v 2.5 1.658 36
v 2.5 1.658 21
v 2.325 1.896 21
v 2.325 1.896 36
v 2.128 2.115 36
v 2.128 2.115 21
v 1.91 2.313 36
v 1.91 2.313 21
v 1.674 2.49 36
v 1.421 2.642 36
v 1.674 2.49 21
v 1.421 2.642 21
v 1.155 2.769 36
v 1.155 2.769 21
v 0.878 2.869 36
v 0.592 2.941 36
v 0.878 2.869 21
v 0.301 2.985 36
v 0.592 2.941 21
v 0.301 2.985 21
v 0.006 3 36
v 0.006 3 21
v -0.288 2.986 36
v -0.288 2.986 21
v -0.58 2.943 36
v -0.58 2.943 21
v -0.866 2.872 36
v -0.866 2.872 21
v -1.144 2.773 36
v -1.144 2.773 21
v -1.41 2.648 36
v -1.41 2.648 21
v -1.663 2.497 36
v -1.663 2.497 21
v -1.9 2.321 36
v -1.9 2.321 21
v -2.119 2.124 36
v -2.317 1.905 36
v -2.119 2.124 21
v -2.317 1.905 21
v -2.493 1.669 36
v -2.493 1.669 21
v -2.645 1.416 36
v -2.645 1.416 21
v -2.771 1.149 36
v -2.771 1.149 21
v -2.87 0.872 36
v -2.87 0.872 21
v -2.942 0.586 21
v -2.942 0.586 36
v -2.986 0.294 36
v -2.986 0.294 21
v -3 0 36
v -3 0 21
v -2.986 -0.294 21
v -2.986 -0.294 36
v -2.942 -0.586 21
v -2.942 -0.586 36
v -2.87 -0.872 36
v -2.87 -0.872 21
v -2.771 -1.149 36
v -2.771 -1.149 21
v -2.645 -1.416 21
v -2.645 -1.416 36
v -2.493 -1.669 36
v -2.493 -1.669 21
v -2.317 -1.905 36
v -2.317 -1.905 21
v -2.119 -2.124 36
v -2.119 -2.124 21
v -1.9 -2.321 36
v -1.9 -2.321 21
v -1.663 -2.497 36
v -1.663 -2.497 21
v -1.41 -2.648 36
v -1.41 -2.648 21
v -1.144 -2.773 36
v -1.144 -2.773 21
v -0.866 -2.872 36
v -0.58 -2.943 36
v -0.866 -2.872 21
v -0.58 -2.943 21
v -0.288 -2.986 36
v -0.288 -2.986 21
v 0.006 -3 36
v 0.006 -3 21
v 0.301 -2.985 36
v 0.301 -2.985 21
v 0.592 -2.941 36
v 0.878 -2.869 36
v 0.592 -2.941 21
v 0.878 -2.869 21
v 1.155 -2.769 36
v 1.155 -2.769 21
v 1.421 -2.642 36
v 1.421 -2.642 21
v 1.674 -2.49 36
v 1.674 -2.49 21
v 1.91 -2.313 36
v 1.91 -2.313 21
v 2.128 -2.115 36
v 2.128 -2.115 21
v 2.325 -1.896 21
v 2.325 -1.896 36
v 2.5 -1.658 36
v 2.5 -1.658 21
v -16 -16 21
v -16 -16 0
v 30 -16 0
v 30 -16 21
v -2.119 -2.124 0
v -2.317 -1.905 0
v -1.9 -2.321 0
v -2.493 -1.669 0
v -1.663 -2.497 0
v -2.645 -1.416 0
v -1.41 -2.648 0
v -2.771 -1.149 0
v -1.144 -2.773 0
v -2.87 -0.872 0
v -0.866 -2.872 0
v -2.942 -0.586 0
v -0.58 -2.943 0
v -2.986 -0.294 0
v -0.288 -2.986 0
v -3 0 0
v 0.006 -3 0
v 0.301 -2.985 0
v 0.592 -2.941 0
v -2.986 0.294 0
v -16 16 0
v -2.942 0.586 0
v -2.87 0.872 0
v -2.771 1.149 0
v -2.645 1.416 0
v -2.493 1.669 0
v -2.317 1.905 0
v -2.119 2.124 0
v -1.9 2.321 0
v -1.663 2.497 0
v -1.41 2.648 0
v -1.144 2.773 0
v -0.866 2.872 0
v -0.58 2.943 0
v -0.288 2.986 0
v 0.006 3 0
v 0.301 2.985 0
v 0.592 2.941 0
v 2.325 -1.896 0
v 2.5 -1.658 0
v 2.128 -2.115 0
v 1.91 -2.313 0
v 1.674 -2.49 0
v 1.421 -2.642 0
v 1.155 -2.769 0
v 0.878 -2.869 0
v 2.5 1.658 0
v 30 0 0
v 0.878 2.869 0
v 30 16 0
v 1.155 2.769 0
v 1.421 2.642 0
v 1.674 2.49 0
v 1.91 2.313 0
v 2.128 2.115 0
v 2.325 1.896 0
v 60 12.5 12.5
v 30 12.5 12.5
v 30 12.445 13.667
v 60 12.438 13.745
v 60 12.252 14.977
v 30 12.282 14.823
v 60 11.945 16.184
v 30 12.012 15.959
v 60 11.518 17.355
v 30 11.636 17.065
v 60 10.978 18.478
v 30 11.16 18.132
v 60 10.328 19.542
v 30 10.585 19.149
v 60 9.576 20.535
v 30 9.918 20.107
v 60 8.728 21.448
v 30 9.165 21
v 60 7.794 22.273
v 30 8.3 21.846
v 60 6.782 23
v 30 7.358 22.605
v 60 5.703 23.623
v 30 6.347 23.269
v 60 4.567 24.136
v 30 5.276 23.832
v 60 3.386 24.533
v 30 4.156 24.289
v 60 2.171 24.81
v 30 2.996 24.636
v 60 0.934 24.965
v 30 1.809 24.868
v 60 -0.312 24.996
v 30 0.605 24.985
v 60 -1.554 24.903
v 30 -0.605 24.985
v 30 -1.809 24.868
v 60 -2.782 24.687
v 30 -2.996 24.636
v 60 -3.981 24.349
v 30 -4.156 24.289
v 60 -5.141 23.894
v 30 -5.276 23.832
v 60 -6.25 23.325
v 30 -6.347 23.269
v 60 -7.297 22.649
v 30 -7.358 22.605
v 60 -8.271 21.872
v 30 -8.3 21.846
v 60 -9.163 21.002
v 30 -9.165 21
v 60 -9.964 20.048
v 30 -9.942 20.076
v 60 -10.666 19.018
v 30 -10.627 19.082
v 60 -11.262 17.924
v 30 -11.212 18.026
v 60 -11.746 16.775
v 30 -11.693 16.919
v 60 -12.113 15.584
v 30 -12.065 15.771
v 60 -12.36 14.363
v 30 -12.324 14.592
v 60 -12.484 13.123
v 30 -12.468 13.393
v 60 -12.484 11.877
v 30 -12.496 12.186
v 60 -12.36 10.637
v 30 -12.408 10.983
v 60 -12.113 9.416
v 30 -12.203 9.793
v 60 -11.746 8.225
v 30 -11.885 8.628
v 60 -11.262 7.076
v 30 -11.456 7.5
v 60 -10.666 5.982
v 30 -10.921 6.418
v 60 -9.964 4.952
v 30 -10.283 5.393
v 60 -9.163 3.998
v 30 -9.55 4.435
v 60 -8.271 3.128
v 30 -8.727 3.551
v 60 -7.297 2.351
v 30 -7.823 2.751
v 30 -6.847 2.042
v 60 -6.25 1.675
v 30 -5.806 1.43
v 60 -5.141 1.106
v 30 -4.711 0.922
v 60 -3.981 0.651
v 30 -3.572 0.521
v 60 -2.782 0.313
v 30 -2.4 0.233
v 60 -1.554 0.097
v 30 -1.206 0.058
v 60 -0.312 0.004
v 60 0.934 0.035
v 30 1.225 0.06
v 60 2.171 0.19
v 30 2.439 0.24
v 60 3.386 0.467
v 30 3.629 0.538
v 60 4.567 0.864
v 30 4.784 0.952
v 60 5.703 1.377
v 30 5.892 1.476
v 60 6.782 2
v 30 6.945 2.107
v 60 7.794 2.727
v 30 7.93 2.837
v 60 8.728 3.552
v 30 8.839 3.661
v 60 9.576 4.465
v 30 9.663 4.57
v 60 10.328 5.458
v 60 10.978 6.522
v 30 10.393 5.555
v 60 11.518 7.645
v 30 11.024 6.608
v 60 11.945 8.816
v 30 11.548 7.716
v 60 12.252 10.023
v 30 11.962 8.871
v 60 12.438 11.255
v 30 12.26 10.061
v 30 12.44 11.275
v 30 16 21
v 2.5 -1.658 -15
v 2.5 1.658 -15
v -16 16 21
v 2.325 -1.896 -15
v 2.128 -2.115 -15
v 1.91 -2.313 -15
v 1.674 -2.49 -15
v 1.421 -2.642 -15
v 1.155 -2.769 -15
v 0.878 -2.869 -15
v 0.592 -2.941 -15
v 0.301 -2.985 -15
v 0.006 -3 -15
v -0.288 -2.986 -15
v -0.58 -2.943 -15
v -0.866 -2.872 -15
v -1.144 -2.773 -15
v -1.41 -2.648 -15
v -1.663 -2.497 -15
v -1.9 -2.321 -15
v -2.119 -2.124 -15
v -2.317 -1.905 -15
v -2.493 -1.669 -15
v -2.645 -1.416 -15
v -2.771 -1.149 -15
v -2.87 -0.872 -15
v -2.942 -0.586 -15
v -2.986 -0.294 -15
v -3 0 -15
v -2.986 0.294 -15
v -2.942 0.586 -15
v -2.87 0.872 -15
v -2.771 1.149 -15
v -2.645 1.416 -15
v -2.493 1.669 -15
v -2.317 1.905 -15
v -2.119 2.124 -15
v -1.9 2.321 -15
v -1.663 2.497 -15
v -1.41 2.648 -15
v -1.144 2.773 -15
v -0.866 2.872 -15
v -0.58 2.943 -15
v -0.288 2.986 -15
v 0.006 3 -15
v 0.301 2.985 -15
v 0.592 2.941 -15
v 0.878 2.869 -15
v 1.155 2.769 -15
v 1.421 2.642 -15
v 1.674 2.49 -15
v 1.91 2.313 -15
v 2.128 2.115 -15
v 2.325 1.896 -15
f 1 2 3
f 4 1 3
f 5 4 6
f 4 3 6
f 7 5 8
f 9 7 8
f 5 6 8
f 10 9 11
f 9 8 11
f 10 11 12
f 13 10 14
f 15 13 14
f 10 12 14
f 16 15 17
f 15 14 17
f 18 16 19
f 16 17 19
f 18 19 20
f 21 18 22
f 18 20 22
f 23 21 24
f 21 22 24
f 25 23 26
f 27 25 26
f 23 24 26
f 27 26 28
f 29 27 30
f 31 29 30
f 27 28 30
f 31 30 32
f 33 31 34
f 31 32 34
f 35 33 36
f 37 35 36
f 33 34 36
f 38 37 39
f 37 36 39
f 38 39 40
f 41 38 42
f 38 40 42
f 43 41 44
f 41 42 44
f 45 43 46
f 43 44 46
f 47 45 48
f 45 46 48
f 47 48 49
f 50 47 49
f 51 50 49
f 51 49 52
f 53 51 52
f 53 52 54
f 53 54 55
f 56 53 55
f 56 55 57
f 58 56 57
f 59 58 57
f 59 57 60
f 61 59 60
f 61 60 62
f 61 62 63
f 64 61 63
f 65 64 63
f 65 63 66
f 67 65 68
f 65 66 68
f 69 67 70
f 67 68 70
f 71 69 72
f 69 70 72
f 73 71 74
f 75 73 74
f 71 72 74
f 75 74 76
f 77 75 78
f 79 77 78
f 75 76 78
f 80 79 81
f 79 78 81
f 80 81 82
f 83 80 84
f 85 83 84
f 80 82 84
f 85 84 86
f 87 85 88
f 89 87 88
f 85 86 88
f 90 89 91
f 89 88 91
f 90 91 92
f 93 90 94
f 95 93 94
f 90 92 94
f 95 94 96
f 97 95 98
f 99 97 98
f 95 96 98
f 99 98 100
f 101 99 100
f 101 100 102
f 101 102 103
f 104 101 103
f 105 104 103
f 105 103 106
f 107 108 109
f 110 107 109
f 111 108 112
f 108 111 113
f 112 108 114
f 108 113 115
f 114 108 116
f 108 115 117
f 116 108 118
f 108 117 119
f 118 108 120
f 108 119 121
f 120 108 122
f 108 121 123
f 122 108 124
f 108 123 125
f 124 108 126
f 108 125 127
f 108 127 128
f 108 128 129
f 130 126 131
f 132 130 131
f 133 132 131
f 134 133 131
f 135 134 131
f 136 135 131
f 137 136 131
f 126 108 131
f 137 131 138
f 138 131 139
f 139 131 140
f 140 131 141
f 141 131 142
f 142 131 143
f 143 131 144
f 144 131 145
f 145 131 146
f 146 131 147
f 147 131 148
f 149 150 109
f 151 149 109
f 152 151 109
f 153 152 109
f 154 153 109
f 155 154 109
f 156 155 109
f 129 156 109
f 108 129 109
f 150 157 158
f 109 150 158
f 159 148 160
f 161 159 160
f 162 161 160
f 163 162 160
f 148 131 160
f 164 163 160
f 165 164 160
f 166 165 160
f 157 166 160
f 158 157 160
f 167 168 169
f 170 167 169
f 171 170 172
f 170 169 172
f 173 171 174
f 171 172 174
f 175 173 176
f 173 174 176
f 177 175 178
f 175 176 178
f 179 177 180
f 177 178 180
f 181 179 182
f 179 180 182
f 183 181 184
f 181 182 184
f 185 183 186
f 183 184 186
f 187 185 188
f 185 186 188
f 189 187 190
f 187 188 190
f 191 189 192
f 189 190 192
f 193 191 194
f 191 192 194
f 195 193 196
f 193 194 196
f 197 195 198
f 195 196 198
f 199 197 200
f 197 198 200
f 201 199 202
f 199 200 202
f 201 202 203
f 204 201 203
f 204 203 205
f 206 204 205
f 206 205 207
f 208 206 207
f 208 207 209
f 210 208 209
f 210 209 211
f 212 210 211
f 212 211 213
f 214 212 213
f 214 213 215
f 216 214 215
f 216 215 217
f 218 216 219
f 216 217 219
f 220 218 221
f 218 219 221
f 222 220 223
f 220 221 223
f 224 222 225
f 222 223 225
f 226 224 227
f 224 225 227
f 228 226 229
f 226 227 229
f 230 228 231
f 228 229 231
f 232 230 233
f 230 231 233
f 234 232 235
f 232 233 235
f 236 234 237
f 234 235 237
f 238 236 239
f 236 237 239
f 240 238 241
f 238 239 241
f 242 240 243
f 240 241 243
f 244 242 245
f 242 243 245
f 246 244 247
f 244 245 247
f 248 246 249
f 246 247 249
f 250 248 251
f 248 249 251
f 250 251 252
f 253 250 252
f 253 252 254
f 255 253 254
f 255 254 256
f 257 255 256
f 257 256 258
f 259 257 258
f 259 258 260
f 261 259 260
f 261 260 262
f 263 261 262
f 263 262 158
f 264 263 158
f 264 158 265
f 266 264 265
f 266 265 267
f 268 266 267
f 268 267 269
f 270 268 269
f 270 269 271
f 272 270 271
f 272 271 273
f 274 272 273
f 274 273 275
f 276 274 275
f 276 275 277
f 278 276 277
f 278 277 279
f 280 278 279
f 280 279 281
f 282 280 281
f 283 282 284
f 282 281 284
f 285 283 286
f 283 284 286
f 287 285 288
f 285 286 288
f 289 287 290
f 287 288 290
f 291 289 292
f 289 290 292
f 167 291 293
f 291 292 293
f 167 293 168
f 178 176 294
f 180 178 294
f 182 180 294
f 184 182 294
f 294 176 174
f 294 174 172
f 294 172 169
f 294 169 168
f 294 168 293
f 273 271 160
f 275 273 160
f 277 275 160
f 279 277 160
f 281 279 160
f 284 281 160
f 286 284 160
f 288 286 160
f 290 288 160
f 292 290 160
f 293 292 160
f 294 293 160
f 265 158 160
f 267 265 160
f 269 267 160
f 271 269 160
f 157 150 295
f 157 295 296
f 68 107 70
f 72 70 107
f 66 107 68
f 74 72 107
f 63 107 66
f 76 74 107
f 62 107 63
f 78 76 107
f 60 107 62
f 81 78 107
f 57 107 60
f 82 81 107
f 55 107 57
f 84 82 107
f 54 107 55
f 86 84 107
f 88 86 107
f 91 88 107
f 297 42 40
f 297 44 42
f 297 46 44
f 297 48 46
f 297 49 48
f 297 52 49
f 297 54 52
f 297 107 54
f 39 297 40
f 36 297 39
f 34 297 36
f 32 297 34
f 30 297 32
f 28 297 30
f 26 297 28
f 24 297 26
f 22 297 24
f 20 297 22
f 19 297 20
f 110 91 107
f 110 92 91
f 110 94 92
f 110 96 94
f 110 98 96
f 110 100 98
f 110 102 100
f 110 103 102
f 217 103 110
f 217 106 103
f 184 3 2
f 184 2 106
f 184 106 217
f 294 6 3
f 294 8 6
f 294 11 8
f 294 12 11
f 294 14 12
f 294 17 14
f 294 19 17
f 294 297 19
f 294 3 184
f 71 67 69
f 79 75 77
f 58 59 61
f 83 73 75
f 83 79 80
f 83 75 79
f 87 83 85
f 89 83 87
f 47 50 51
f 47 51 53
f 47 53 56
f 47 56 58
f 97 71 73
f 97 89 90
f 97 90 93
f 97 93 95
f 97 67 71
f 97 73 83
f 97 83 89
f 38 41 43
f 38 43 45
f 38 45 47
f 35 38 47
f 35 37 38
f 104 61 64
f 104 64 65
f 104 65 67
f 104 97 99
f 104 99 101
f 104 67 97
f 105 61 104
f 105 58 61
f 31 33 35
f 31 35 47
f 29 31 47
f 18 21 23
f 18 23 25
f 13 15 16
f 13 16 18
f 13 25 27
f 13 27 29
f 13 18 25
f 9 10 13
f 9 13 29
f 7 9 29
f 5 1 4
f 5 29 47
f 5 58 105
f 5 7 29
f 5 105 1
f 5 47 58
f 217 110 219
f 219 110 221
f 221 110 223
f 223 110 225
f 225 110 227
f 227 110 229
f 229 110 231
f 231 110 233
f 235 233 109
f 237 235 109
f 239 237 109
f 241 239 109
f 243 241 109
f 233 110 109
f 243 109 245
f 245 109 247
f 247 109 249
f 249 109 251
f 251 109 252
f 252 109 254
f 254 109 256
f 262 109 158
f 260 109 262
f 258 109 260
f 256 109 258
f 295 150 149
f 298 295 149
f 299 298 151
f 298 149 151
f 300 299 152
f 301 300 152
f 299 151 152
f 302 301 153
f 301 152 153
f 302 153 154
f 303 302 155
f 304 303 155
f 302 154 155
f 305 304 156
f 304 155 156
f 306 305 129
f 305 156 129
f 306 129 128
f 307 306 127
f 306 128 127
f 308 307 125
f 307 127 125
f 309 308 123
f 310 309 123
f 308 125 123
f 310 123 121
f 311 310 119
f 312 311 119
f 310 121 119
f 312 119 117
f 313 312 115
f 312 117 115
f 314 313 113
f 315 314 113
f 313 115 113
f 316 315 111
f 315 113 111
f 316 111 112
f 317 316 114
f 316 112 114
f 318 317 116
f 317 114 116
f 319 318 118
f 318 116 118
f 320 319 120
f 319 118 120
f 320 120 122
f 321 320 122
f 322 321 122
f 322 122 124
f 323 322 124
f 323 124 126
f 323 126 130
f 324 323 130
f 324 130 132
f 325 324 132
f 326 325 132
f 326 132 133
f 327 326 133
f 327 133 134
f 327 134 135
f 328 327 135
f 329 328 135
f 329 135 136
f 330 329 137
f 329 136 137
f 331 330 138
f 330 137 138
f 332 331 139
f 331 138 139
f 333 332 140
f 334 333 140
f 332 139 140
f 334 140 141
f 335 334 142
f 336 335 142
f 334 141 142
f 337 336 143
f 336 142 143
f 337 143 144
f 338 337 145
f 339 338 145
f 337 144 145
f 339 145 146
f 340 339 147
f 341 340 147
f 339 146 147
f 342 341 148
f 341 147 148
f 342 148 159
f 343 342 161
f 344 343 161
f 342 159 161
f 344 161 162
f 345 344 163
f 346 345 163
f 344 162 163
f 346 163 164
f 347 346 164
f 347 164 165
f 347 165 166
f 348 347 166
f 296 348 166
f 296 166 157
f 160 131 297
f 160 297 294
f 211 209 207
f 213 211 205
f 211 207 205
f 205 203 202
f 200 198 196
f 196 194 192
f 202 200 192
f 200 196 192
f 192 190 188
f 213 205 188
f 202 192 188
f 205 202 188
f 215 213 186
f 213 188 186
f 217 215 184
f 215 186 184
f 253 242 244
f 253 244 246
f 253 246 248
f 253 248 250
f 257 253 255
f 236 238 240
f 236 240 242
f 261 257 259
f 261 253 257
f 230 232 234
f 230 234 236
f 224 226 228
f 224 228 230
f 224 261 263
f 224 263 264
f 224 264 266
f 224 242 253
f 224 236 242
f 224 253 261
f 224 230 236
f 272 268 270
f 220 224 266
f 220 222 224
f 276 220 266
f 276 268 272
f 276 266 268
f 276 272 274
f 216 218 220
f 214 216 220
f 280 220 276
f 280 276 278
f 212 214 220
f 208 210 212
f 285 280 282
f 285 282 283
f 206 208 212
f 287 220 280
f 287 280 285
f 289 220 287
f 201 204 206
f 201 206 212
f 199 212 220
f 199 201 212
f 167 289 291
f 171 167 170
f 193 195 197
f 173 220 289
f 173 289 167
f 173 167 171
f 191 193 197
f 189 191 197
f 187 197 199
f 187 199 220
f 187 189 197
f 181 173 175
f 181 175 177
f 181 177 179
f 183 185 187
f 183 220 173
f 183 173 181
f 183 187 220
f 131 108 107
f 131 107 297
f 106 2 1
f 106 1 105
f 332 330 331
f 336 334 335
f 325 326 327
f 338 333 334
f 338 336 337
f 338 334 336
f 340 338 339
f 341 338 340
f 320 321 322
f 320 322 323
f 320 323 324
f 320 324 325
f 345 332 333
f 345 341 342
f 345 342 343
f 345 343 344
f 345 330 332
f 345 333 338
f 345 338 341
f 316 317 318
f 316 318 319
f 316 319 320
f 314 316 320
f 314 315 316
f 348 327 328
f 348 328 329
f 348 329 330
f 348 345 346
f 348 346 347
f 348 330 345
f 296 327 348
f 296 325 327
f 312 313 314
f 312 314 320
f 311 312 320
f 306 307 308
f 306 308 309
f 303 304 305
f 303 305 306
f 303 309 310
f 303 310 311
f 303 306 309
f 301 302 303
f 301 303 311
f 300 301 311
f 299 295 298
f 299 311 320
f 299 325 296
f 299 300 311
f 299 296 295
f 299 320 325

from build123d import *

# Parameters (mm, degrees)
SKETCH_W     = 46
SKETCH_H     = 32
PAD_DEPTH    = 21
SKETCH001_R  = 12.5
PAD001_DEPTH = 30
PAD002_DEPTH = 15
PAD003_DEPTH = 15


with BuildPart() as part:
    # Sketch → Pad (new body)
    with BuildSketch(Plane.XY):
        with Locations((7, 0)):
            Rectangle(SKETCH_W, SKETCH_H)
    extrude(amount=PAD_DEPTH)

    # Sketch001 (on Face2 of Pad) → Pad001 (join)
    with BuildSketch(Plane.YZ.offset(30)):
        with Locations((0, 12.5)):
            Circle(SKETCH001_R)
    extrude(amount=PAD001_DEPTH)

    # Sketch002 (on Face4 of Pad001) → Pad002 (join)
    with BuildSketch(Plane(origin=(0, 0, 0), x_dir=(1, 0, 0), z_dir=(0, 0, -1))):
        with BuildLine():
            ThreePointArc((2.5, 1.658312), (-3, 0), (2.5, -1.658312))
            Line((2.5, 1.658312), (2.5, -1.658312))
        make_face()
    extrude(amount=PAD002_DEPTH)

    # Sketch003 (on Face5 of Pad002) → Pad003 (join)
    with BuildSketch(Plane.XY.offset(21)):
        with BuildLine():
            ThreePointArc((2.5, 1.658312), (-3, 0), (2.5, -1.658312))
            Line((2.5, 1.658312), (2.5, -1.658312))
        make_face()
    extrude(amount=PAD003_DEPTH)


solid = part.part
